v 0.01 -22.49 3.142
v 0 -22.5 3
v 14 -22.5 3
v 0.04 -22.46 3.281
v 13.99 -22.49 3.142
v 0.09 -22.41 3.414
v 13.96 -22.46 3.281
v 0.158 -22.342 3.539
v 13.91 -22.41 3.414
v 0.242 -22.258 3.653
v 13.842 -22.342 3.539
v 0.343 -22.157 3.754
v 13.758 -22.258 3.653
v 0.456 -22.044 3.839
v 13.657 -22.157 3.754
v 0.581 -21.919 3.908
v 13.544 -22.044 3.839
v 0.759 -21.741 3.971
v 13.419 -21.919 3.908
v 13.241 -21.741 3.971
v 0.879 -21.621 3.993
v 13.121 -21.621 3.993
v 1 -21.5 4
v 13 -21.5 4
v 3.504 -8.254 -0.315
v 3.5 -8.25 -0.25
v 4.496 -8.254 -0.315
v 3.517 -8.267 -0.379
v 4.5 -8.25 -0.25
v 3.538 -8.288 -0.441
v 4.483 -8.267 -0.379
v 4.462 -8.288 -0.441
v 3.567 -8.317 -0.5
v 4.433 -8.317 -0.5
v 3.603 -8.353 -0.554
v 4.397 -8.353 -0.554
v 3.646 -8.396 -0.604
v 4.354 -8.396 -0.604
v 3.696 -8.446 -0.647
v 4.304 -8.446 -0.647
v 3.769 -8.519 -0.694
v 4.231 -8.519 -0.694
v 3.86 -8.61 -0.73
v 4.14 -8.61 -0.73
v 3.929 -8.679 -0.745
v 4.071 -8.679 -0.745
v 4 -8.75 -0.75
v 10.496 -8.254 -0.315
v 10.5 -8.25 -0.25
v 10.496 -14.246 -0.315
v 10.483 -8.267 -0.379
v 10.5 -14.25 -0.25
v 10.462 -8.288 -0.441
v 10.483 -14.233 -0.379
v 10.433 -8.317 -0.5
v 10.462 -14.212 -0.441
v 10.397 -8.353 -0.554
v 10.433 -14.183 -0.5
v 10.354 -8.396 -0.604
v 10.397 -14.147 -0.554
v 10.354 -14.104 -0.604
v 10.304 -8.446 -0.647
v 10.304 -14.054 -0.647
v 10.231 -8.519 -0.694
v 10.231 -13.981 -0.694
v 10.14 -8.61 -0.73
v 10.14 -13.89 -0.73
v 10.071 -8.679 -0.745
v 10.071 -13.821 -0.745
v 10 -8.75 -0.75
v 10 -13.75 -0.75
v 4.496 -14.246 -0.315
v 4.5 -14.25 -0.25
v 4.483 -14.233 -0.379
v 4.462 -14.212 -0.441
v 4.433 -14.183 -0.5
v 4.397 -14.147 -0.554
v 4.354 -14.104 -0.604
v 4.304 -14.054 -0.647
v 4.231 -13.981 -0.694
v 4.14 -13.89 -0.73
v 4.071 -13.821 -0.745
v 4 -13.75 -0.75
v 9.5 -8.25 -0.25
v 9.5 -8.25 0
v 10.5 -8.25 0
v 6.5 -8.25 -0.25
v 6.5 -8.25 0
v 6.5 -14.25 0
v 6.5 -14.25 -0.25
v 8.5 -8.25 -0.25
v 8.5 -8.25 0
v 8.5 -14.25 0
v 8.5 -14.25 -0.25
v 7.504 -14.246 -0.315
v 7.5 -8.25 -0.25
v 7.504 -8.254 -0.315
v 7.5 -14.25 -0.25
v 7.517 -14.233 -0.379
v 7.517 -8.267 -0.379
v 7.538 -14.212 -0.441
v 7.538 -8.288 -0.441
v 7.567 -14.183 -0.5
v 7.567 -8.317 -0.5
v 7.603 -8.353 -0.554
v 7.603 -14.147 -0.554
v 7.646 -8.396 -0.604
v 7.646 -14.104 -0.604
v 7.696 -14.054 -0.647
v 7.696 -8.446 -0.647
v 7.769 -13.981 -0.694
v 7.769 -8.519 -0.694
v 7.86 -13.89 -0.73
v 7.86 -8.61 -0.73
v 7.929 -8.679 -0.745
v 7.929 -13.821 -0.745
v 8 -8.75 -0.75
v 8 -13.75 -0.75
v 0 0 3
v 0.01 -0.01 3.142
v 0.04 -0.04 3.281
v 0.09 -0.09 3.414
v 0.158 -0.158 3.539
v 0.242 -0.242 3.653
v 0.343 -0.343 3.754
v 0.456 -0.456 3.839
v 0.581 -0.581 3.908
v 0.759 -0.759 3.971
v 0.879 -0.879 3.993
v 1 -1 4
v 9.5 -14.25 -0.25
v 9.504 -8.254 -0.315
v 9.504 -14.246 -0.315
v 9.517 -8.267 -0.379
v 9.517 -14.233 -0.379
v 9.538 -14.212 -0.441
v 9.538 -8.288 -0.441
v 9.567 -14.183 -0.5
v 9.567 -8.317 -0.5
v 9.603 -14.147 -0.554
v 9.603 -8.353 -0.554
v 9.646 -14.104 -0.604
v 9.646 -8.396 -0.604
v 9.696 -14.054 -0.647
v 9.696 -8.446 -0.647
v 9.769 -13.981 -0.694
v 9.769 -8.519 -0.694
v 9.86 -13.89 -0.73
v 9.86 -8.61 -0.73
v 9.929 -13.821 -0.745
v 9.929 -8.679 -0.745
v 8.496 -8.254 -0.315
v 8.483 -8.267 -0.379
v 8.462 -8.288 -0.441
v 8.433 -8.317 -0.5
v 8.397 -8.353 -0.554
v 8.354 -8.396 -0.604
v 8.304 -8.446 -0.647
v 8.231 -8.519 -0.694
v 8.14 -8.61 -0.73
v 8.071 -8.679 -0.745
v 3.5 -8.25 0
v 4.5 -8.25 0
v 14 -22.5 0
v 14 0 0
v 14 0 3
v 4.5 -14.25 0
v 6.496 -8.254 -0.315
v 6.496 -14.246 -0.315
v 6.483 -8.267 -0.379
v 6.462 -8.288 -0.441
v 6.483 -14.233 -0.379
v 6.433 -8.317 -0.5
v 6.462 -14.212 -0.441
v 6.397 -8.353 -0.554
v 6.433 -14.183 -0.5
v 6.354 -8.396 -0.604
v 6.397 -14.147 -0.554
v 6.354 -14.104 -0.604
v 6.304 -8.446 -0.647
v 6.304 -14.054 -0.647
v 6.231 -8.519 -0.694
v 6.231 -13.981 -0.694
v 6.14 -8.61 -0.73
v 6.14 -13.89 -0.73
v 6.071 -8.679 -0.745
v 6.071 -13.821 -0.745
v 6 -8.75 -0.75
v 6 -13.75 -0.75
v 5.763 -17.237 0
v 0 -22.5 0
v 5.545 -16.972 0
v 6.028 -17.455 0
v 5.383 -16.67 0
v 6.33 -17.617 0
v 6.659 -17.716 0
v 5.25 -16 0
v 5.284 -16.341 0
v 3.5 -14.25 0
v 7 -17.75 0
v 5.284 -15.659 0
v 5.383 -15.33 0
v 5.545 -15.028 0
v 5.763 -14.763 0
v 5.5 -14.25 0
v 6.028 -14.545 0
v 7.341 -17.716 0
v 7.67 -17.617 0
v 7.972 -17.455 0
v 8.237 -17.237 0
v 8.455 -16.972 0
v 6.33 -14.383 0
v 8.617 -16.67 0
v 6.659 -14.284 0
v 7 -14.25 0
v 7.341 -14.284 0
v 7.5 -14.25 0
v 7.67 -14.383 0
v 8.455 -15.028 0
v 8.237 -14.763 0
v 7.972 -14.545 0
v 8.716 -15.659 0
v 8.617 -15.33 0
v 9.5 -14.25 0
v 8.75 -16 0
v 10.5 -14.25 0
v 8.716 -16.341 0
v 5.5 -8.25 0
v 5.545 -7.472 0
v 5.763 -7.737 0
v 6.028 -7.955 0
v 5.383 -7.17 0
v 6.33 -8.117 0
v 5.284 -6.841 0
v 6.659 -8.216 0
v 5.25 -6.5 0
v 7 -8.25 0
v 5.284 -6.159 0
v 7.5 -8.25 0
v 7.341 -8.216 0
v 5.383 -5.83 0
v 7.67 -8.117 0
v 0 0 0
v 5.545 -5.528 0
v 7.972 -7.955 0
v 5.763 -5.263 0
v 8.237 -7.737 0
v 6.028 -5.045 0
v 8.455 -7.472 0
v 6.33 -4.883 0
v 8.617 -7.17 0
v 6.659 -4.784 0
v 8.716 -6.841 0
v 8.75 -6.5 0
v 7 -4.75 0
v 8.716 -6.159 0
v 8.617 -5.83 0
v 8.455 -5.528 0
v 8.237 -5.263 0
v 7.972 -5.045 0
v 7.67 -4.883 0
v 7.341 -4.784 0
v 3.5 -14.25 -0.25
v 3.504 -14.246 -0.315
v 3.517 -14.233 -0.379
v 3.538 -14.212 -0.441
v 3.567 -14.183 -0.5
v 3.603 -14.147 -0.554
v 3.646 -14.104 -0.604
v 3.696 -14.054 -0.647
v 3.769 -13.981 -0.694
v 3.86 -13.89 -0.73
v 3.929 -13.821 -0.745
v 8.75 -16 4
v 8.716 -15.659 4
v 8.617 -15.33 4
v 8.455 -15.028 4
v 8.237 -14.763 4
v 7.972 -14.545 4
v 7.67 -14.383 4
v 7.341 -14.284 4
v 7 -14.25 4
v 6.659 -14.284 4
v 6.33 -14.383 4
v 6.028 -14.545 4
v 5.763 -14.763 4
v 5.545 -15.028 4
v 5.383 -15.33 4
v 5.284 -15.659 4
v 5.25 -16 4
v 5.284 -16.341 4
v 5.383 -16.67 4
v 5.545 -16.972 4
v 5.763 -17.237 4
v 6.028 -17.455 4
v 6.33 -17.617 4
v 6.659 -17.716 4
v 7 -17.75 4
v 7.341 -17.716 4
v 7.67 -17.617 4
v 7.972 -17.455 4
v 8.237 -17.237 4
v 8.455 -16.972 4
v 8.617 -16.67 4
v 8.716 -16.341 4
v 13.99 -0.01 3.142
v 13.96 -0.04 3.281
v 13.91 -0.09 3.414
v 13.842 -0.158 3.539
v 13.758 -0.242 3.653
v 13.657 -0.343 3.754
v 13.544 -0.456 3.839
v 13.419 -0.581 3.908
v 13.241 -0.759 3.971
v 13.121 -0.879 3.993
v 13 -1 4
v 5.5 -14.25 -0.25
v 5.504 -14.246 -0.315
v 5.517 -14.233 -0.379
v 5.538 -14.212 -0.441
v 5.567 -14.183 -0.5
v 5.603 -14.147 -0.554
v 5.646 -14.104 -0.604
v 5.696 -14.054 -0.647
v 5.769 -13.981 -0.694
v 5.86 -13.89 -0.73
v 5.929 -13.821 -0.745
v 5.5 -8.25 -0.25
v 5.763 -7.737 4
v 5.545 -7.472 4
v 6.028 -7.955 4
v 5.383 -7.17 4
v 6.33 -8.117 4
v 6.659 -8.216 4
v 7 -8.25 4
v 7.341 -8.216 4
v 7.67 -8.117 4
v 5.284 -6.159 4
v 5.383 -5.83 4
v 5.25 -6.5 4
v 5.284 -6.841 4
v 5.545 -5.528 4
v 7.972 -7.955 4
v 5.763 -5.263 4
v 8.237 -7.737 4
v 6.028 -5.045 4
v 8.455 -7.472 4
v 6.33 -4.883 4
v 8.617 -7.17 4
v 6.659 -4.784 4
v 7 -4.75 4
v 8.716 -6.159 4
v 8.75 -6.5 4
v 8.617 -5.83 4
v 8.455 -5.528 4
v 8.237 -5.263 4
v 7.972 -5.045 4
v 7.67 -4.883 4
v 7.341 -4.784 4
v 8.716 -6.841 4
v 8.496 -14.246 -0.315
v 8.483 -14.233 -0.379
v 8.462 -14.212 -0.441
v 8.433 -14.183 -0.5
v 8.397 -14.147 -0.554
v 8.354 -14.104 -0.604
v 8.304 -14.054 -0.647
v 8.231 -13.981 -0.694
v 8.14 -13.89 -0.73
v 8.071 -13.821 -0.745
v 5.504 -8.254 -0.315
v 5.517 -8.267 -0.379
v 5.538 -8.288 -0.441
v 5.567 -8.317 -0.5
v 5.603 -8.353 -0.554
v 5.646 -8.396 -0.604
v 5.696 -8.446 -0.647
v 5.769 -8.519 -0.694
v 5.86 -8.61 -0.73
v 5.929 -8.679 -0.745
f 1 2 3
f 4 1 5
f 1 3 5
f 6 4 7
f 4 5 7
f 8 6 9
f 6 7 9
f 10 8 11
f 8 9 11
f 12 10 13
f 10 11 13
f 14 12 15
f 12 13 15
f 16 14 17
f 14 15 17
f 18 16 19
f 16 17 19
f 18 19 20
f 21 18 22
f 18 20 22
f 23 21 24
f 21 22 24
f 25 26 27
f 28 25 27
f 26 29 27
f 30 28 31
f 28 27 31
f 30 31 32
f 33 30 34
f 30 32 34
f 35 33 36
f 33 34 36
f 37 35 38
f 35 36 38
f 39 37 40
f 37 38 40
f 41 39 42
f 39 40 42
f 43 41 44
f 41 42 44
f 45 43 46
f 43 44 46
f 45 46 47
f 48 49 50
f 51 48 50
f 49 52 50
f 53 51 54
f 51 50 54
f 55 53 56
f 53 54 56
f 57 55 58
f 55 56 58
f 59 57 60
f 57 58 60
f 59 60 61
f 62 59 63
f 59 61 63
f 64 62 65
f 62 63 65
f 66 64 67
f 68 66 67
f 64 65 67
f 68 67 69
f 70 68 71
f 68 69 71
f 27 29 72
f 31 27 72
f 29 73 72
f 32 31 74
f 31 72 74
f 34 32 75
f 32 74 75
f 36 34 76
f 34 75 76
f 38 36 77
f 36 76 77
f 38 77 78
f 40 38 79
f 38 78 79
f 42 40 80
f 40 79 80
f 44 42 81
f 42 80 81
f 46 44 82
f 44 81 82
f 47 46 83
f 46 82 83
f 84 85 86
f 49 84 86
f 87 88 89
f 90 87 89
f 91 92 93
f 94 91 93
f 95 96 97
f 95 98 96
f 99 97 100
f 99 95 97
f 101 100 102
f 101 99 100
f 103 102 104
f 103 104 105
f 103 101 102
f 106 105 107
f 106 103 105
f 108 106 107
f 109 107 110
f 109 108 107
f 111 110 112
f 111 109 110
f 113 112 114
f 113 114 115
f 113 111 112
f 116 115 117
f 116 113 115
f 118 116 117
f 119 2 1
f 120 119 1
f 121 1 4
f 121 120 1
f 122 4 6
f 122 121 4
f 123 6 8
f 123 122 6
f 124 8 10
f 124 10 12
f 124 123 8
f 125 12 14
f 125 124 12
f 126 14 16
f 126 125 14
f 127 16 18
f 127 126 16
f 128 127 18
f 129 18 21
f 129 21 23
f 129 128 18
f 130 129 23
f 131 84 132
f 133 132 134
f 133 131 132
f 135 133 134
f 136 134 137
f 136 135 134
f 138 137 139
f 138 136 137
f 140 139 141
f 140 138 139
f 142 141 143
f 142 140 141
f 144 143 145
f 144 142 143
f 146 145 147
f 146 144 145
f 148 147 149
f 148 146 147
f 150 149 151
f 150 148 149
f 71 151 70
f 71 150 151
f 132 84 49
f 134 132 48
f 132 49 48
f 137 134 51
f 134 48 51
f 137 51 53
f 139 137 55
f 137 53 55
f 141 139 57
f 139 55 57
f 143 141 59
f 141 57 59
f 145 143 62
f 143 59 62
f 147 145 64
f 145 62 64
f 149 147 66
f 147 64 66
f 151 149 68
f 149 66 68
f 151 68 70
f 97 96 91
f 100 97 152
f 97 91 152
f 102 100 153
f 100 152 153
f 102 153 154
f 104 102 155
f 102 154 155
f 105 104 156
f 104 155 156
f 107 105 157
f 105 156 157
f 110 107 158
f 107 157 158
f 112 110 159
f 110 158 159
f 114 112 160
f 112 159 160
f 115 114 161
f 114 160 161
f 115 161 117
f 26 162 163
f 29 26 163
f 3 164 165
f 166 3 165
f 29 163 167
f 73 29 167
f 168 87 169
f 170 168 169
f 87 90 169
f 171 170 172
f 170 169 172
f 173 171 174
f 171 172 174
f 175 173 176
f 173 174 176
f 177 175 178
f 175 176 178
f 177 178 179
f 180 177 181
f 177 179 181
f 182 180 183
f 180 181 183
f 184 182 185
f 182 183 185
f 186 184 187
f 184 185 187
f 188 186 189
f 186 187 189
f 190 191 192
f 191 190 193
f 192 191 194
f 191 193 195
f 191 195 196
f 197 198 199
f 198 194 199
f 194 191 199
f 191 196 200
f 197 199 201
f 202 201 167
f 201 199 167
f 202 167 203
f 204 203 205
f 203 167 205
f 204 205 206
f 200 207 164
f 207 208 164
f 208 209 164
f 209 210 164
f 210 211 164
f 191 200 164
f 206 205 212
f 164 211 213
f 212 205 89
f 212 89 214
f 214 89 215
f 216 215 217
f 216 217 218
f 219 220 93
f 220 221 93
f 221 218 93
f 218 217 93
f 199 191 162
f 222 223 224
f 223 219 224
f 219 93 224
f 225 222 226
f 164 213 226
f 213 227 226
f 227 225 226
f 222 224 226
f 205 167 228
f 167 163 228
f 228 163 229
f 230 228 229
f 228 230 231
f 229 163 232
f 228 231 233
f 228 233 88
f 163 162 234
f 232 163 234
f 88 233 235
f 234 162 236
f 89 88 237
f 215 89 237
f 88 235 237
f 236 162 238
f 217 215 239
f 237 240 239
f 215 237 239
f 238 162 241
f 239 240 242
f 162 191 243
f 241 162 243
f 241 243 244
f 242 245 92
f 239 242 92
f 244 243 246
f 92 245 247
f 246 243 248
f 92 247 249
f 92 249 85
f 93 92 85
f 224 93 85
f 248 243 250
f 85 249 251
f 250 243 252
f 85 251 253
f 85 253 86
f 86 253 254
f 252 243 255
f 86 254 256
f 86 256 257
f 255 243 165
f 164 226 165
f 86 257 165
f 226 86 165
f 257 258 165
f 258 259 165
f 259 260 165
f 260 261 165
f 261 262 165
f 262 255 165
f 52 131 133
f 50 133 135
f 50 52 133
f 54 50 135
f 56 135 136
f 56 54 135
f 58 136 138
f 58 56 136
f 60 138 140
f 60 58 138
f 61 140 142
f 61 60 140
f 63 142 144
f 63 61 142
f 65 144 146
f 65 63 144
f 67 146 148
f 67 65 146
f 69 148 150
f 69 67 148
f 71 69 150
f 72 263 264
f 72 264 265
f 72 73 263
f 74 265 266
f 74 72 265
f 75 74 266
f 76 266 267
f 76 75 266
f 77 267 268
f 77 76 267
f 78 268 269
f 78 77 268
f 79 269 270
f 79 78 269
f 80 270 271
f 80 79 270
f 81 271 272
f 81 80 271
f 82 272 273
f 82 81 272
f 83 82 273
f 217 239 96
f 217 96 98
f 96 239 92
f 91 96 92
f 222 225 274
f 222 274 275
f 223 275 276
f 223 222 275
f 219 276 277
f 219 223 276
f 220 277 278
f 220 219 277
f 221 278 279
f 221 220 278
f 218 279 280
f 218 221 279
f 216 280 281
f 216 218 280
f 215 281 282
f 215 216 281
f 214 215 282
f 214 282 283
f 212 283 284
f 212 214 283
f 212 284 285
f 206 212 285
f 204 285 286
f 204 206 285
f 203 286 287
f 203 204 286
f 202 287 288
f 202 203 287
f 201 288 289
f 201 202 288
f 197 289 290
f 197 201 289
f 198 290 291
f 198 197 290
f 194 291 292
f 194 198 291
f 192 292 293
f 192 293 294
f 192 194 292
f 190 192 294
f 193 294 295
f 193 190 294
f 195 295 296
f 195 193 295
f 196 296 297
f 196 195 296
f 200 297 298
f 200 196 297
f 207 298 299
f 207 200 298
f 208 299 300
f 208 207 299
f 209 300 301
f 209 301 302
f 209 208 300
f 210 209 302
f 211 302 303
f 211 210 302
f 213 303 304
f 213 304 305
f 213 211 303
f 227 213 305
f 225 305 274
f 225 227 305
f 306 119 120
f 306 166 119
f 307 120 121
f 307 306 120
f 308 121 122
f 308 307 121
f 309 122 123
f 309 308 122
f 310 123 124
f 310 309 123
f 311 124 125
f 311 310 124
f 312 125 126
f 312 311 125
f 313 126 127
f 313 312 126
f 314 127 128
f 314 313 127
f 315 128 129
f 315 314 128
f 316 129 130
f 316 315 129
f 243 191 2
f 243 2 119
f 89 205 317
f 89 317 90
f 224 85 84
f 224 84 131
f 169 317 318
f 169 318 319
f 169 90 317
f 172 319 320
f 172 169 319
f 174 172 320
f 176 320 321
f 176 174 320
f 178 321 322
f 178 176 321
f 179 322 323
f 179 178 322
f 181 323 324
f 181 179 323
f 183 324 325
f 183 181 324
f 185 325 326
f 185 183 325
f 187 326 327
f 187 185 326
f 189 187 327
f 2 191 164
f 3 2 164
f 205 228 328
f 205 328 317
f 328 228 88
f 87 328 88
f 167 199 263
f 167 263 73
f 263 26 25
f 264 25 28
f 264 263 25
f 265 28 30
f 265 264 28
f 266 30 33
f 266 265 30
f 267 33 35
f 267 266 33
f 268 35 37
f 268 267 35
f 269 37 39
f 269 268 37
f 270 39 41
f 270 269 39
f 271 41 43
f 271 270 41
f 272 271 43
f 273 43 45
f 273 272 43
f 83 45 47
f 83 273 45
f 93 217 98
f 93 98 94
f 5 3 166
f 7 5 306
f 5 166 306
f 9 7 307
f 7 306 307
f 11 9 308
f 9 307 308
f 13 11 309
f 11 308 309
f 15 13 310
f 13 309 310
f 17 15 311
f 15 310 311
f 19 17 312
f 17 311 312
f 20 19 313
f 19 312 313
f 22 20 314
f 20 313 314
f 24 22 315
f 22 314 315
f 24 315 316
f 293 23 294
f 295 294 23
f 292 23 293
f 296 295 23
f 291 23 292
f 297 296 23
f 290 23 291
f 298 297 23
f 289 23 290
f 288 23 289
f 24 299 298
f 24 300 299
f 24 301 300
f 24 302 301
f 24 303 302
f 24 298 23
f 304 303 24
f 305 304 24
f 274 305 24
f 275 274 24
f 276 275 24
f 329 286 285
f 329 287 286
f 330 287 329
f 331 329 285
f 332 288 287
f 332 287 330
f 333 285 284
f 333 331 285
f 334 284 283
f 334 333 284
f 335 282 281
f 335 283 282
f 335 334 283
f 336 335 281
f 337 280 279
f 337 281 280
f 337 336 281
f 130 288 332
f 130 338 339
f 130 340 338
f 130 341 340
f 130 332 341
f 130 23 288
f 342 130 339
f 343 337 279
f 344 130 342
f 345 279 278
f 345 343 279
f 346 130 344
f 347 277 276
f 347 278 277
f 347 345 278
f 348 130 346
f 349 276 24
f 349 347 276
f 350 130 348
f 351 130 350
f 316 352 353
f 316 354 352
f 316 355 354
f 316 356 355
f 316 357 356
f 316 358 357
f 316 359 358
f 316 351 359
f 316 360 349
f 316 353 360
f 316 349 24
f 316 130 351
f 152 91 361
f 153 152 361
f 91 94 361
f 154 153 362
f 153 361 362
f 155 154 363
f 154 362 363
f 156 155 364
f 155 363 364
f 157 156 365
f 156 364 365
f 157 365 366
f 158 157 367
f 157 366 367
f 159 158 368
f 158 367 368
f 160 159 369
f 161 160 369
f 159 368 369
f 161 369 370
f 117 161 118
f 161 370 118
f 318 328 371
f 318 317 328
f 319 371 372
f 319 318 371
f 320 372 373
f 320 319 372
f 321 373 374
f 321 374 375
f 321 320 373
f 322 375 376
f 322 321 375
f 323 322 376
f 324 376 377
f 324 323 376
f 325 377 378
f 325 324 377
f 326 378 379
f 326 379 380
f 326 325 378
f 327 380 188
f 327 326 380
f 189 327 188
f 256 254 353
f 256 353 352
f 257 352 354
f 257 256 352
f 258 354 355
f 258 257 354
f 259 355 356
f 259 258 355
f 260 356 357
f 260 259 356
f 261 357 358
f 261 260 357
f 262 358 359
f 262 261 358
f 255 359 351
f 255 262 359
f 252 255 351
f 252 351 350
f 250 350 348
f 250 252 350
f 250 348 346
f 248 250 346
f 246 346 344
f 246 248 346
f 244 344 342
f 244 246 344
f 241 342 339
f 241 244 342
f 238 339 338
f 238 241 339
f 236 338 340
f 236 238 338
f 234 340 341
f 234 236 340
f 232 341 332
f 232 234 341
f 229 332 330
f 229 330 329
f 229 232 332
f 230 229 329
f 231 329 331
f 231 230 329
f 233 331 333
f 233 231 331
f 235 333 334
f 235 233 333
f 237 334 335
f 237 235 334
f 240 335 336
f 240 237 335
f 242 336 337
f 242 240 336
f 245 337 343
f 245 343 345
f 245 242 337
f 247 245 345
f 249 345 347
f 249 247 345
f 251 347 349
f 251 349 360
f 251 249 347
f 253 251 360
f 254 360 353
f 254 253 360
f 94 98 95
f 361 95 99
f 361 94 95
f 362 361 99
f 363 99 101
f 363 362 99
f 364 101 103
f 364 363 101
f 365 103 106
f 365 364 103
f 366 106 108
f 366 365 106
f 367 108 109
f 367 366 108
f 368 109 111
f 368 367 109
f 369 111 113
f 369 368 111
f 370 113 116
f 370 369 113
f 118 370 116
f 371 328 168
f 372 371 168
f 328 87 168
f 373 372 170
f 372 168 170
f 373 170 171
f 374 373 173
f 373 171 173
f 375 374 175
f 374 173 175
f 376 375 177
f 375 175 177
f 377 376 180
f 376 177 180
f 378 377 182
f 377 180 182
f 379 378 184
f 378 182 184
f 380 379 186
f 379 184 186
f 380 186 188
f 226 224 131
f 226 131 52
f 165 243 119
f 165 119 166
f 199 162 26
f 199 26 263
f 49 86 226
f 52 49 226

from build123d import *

# Parameters (mm, degrees)
F0_W     = 14
F0_H     = 22.5
F0_R     = 1.75
F1_DEPTH = 4
F2_R     = 1
F3_W     = 1
F3_H     = 6
F4_DEPTH = 0.75
F5_R     = 0.49999


# Not quite as in the source:
# - a fillet or chamfer is up to 0.001 mm smaller than in the source, because OpenCascade refuses the exact size


with BuildPart() as f1:
    # F0 (on Top) → F1 (new body)
    with BuildSketch(Plane.XY):
        with Locations((7, -11.25)):
            Rectangle(F0_W, F0_H)
        with Locations((7, -16)):
            Circle(F0_R, mode=Mode.SUBTRACT)
        with Locations((7, -6.5)):
            Circle(F0_R, mode=Mode.SUBTRACT)
    extrude(amount=F1_DEPTH)

    # F2
    f2_edges = [f1.edges().sort_by_distance(p)[0] for p in [
        (7, 0, 4),
        (0, -11.25, 4),
        (14, -11.25, 4),
        (7, -22.5, 4),
    ]]
    fillet(f2_edges, radius=F2_R)

    # F3 (on face) → F4 (join)
    with BuildSketch(Plane(origin=(0, 0, 0), x_dir=(1, 0, 0), z_dir=(0, 0, -1))):
        with Locations((4, 11.25)):
            Rectangle(F3_W, F3_H)
        with Locations((6, 11.25)):
            Rectangle(F3_W, F3_H)
        with Locations((8, 11.25)):
            Rectangle(F3_W, F3_H)
        with Locations((10, 11.25)):
            Rectangle(F3_W, F3_H)
    extrude(amount=F4_DEPTH)

    # F5 (radius 0.5 in the source; OpenCascade refuses exactly that, so slightly less here)
    f5_edges = [f1.edges().sort_by_distance(p)[0] for p in [
        (10, -8.25, -0.75),
        (10.5, -11.25, -0.75),
        (10, -14.25, -0.75),
        (9.5, -11.25, -0.75),
        (8, -8.25, -0.75),
        (8.5, -11.25, -0.75),
        (8, -14.25, -0.75),
        (7.5, -11.25, -0.75),
        (6, -8.25, -0.75),
        (6.5, -11.25, -0.75),
        (6, -14.25, -0.75),
        (5.5, -11.25, -0.75),
        (4, -8.25, -0.75),
        (4.5, -11.25, -0.75),
        (4, -14.25, -0.75),
        (3.5, -11.25, -0.75),
    ]]
    fillet(f5_edges, radius=F5_R)


solid = f1.part
